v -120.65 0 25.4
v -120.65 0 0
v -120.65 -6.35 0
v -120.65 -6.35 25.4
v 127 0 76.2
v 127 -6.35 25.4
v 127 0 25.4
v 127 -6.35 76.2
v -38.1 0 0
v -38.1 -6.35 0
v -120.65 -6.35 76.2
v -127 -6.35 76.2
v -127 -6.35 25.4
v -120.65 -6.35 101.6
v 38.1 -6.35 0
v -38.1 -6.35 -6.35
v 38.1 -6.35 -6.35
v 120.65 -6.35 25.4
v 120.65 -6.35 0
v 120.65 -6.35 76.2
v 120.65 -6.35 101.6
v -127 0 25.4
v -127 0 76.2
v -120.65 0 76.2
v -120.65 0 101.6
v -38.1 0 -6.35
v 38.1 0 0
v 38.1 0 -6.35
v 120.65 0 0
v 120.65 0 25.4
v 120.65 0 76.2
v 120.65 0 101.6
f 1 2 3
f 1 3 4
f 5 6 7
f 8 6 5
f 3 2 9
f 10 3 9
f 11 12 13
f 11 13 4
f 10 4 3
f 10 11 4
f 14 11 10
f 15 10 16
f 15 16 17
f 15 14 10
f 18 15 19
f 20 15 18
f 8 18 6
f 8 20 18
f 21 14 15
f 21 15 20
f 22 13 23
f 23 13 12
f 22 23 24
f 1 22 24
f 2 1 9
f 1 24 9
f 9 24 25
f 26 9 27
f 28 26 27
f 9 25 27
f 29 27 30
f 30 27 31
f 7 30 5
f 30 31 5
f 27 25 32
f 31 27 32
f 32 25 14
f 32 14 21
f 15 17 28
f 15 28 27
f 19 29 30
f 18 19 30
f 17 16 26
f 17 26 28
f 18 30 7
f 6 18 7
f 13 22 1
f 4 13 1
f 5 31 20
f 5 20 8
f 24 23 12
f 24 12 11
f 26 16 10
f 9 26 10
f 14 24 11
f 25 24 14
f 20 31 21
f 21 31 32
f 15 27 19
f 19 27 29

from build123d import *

# Parameters (mm, degrees)
F0_W     = 241.3
F0_H     = 101.6
F1_DEPTH = 6.35
F2_W     = 76.2
F2_H     = 6.35
F3_DEPTH = 6.35
F4_W     = 6.35
F4_H     = 50.8
F5_DEPTH = 6.35


with BuildPart() as f1:
    # F0 (on Front) → F1 (new body)
    with BuildSketch(Plane.XZ):
        with Locations((0, 50.8)):
            Rectangle(F0_W, F0_H)
    extrude(amount=F1_DEPTH)

    # F2 (on face) → F3 (join)
    with BuildSketch(Plane.XZ.offset(6.35)):
        with Locations((0, -3.175)):
            Rectangle(F2_W, F2_H)
    extrude(amount=-F3_DEPTH)

    # F4 (on face) → F5 (join)
    with BuildSketch(Plane.XZ.offset(6.35)):
        with Locations((-123.825, 50.8)):
            Rectangle(F4_W, F4_H)
        with Locations((123.825, 50.8)):
            Rectangle(F4_W, F4_H)
    extrude(amount=-F5_DEPTH)


solid = f1.part
